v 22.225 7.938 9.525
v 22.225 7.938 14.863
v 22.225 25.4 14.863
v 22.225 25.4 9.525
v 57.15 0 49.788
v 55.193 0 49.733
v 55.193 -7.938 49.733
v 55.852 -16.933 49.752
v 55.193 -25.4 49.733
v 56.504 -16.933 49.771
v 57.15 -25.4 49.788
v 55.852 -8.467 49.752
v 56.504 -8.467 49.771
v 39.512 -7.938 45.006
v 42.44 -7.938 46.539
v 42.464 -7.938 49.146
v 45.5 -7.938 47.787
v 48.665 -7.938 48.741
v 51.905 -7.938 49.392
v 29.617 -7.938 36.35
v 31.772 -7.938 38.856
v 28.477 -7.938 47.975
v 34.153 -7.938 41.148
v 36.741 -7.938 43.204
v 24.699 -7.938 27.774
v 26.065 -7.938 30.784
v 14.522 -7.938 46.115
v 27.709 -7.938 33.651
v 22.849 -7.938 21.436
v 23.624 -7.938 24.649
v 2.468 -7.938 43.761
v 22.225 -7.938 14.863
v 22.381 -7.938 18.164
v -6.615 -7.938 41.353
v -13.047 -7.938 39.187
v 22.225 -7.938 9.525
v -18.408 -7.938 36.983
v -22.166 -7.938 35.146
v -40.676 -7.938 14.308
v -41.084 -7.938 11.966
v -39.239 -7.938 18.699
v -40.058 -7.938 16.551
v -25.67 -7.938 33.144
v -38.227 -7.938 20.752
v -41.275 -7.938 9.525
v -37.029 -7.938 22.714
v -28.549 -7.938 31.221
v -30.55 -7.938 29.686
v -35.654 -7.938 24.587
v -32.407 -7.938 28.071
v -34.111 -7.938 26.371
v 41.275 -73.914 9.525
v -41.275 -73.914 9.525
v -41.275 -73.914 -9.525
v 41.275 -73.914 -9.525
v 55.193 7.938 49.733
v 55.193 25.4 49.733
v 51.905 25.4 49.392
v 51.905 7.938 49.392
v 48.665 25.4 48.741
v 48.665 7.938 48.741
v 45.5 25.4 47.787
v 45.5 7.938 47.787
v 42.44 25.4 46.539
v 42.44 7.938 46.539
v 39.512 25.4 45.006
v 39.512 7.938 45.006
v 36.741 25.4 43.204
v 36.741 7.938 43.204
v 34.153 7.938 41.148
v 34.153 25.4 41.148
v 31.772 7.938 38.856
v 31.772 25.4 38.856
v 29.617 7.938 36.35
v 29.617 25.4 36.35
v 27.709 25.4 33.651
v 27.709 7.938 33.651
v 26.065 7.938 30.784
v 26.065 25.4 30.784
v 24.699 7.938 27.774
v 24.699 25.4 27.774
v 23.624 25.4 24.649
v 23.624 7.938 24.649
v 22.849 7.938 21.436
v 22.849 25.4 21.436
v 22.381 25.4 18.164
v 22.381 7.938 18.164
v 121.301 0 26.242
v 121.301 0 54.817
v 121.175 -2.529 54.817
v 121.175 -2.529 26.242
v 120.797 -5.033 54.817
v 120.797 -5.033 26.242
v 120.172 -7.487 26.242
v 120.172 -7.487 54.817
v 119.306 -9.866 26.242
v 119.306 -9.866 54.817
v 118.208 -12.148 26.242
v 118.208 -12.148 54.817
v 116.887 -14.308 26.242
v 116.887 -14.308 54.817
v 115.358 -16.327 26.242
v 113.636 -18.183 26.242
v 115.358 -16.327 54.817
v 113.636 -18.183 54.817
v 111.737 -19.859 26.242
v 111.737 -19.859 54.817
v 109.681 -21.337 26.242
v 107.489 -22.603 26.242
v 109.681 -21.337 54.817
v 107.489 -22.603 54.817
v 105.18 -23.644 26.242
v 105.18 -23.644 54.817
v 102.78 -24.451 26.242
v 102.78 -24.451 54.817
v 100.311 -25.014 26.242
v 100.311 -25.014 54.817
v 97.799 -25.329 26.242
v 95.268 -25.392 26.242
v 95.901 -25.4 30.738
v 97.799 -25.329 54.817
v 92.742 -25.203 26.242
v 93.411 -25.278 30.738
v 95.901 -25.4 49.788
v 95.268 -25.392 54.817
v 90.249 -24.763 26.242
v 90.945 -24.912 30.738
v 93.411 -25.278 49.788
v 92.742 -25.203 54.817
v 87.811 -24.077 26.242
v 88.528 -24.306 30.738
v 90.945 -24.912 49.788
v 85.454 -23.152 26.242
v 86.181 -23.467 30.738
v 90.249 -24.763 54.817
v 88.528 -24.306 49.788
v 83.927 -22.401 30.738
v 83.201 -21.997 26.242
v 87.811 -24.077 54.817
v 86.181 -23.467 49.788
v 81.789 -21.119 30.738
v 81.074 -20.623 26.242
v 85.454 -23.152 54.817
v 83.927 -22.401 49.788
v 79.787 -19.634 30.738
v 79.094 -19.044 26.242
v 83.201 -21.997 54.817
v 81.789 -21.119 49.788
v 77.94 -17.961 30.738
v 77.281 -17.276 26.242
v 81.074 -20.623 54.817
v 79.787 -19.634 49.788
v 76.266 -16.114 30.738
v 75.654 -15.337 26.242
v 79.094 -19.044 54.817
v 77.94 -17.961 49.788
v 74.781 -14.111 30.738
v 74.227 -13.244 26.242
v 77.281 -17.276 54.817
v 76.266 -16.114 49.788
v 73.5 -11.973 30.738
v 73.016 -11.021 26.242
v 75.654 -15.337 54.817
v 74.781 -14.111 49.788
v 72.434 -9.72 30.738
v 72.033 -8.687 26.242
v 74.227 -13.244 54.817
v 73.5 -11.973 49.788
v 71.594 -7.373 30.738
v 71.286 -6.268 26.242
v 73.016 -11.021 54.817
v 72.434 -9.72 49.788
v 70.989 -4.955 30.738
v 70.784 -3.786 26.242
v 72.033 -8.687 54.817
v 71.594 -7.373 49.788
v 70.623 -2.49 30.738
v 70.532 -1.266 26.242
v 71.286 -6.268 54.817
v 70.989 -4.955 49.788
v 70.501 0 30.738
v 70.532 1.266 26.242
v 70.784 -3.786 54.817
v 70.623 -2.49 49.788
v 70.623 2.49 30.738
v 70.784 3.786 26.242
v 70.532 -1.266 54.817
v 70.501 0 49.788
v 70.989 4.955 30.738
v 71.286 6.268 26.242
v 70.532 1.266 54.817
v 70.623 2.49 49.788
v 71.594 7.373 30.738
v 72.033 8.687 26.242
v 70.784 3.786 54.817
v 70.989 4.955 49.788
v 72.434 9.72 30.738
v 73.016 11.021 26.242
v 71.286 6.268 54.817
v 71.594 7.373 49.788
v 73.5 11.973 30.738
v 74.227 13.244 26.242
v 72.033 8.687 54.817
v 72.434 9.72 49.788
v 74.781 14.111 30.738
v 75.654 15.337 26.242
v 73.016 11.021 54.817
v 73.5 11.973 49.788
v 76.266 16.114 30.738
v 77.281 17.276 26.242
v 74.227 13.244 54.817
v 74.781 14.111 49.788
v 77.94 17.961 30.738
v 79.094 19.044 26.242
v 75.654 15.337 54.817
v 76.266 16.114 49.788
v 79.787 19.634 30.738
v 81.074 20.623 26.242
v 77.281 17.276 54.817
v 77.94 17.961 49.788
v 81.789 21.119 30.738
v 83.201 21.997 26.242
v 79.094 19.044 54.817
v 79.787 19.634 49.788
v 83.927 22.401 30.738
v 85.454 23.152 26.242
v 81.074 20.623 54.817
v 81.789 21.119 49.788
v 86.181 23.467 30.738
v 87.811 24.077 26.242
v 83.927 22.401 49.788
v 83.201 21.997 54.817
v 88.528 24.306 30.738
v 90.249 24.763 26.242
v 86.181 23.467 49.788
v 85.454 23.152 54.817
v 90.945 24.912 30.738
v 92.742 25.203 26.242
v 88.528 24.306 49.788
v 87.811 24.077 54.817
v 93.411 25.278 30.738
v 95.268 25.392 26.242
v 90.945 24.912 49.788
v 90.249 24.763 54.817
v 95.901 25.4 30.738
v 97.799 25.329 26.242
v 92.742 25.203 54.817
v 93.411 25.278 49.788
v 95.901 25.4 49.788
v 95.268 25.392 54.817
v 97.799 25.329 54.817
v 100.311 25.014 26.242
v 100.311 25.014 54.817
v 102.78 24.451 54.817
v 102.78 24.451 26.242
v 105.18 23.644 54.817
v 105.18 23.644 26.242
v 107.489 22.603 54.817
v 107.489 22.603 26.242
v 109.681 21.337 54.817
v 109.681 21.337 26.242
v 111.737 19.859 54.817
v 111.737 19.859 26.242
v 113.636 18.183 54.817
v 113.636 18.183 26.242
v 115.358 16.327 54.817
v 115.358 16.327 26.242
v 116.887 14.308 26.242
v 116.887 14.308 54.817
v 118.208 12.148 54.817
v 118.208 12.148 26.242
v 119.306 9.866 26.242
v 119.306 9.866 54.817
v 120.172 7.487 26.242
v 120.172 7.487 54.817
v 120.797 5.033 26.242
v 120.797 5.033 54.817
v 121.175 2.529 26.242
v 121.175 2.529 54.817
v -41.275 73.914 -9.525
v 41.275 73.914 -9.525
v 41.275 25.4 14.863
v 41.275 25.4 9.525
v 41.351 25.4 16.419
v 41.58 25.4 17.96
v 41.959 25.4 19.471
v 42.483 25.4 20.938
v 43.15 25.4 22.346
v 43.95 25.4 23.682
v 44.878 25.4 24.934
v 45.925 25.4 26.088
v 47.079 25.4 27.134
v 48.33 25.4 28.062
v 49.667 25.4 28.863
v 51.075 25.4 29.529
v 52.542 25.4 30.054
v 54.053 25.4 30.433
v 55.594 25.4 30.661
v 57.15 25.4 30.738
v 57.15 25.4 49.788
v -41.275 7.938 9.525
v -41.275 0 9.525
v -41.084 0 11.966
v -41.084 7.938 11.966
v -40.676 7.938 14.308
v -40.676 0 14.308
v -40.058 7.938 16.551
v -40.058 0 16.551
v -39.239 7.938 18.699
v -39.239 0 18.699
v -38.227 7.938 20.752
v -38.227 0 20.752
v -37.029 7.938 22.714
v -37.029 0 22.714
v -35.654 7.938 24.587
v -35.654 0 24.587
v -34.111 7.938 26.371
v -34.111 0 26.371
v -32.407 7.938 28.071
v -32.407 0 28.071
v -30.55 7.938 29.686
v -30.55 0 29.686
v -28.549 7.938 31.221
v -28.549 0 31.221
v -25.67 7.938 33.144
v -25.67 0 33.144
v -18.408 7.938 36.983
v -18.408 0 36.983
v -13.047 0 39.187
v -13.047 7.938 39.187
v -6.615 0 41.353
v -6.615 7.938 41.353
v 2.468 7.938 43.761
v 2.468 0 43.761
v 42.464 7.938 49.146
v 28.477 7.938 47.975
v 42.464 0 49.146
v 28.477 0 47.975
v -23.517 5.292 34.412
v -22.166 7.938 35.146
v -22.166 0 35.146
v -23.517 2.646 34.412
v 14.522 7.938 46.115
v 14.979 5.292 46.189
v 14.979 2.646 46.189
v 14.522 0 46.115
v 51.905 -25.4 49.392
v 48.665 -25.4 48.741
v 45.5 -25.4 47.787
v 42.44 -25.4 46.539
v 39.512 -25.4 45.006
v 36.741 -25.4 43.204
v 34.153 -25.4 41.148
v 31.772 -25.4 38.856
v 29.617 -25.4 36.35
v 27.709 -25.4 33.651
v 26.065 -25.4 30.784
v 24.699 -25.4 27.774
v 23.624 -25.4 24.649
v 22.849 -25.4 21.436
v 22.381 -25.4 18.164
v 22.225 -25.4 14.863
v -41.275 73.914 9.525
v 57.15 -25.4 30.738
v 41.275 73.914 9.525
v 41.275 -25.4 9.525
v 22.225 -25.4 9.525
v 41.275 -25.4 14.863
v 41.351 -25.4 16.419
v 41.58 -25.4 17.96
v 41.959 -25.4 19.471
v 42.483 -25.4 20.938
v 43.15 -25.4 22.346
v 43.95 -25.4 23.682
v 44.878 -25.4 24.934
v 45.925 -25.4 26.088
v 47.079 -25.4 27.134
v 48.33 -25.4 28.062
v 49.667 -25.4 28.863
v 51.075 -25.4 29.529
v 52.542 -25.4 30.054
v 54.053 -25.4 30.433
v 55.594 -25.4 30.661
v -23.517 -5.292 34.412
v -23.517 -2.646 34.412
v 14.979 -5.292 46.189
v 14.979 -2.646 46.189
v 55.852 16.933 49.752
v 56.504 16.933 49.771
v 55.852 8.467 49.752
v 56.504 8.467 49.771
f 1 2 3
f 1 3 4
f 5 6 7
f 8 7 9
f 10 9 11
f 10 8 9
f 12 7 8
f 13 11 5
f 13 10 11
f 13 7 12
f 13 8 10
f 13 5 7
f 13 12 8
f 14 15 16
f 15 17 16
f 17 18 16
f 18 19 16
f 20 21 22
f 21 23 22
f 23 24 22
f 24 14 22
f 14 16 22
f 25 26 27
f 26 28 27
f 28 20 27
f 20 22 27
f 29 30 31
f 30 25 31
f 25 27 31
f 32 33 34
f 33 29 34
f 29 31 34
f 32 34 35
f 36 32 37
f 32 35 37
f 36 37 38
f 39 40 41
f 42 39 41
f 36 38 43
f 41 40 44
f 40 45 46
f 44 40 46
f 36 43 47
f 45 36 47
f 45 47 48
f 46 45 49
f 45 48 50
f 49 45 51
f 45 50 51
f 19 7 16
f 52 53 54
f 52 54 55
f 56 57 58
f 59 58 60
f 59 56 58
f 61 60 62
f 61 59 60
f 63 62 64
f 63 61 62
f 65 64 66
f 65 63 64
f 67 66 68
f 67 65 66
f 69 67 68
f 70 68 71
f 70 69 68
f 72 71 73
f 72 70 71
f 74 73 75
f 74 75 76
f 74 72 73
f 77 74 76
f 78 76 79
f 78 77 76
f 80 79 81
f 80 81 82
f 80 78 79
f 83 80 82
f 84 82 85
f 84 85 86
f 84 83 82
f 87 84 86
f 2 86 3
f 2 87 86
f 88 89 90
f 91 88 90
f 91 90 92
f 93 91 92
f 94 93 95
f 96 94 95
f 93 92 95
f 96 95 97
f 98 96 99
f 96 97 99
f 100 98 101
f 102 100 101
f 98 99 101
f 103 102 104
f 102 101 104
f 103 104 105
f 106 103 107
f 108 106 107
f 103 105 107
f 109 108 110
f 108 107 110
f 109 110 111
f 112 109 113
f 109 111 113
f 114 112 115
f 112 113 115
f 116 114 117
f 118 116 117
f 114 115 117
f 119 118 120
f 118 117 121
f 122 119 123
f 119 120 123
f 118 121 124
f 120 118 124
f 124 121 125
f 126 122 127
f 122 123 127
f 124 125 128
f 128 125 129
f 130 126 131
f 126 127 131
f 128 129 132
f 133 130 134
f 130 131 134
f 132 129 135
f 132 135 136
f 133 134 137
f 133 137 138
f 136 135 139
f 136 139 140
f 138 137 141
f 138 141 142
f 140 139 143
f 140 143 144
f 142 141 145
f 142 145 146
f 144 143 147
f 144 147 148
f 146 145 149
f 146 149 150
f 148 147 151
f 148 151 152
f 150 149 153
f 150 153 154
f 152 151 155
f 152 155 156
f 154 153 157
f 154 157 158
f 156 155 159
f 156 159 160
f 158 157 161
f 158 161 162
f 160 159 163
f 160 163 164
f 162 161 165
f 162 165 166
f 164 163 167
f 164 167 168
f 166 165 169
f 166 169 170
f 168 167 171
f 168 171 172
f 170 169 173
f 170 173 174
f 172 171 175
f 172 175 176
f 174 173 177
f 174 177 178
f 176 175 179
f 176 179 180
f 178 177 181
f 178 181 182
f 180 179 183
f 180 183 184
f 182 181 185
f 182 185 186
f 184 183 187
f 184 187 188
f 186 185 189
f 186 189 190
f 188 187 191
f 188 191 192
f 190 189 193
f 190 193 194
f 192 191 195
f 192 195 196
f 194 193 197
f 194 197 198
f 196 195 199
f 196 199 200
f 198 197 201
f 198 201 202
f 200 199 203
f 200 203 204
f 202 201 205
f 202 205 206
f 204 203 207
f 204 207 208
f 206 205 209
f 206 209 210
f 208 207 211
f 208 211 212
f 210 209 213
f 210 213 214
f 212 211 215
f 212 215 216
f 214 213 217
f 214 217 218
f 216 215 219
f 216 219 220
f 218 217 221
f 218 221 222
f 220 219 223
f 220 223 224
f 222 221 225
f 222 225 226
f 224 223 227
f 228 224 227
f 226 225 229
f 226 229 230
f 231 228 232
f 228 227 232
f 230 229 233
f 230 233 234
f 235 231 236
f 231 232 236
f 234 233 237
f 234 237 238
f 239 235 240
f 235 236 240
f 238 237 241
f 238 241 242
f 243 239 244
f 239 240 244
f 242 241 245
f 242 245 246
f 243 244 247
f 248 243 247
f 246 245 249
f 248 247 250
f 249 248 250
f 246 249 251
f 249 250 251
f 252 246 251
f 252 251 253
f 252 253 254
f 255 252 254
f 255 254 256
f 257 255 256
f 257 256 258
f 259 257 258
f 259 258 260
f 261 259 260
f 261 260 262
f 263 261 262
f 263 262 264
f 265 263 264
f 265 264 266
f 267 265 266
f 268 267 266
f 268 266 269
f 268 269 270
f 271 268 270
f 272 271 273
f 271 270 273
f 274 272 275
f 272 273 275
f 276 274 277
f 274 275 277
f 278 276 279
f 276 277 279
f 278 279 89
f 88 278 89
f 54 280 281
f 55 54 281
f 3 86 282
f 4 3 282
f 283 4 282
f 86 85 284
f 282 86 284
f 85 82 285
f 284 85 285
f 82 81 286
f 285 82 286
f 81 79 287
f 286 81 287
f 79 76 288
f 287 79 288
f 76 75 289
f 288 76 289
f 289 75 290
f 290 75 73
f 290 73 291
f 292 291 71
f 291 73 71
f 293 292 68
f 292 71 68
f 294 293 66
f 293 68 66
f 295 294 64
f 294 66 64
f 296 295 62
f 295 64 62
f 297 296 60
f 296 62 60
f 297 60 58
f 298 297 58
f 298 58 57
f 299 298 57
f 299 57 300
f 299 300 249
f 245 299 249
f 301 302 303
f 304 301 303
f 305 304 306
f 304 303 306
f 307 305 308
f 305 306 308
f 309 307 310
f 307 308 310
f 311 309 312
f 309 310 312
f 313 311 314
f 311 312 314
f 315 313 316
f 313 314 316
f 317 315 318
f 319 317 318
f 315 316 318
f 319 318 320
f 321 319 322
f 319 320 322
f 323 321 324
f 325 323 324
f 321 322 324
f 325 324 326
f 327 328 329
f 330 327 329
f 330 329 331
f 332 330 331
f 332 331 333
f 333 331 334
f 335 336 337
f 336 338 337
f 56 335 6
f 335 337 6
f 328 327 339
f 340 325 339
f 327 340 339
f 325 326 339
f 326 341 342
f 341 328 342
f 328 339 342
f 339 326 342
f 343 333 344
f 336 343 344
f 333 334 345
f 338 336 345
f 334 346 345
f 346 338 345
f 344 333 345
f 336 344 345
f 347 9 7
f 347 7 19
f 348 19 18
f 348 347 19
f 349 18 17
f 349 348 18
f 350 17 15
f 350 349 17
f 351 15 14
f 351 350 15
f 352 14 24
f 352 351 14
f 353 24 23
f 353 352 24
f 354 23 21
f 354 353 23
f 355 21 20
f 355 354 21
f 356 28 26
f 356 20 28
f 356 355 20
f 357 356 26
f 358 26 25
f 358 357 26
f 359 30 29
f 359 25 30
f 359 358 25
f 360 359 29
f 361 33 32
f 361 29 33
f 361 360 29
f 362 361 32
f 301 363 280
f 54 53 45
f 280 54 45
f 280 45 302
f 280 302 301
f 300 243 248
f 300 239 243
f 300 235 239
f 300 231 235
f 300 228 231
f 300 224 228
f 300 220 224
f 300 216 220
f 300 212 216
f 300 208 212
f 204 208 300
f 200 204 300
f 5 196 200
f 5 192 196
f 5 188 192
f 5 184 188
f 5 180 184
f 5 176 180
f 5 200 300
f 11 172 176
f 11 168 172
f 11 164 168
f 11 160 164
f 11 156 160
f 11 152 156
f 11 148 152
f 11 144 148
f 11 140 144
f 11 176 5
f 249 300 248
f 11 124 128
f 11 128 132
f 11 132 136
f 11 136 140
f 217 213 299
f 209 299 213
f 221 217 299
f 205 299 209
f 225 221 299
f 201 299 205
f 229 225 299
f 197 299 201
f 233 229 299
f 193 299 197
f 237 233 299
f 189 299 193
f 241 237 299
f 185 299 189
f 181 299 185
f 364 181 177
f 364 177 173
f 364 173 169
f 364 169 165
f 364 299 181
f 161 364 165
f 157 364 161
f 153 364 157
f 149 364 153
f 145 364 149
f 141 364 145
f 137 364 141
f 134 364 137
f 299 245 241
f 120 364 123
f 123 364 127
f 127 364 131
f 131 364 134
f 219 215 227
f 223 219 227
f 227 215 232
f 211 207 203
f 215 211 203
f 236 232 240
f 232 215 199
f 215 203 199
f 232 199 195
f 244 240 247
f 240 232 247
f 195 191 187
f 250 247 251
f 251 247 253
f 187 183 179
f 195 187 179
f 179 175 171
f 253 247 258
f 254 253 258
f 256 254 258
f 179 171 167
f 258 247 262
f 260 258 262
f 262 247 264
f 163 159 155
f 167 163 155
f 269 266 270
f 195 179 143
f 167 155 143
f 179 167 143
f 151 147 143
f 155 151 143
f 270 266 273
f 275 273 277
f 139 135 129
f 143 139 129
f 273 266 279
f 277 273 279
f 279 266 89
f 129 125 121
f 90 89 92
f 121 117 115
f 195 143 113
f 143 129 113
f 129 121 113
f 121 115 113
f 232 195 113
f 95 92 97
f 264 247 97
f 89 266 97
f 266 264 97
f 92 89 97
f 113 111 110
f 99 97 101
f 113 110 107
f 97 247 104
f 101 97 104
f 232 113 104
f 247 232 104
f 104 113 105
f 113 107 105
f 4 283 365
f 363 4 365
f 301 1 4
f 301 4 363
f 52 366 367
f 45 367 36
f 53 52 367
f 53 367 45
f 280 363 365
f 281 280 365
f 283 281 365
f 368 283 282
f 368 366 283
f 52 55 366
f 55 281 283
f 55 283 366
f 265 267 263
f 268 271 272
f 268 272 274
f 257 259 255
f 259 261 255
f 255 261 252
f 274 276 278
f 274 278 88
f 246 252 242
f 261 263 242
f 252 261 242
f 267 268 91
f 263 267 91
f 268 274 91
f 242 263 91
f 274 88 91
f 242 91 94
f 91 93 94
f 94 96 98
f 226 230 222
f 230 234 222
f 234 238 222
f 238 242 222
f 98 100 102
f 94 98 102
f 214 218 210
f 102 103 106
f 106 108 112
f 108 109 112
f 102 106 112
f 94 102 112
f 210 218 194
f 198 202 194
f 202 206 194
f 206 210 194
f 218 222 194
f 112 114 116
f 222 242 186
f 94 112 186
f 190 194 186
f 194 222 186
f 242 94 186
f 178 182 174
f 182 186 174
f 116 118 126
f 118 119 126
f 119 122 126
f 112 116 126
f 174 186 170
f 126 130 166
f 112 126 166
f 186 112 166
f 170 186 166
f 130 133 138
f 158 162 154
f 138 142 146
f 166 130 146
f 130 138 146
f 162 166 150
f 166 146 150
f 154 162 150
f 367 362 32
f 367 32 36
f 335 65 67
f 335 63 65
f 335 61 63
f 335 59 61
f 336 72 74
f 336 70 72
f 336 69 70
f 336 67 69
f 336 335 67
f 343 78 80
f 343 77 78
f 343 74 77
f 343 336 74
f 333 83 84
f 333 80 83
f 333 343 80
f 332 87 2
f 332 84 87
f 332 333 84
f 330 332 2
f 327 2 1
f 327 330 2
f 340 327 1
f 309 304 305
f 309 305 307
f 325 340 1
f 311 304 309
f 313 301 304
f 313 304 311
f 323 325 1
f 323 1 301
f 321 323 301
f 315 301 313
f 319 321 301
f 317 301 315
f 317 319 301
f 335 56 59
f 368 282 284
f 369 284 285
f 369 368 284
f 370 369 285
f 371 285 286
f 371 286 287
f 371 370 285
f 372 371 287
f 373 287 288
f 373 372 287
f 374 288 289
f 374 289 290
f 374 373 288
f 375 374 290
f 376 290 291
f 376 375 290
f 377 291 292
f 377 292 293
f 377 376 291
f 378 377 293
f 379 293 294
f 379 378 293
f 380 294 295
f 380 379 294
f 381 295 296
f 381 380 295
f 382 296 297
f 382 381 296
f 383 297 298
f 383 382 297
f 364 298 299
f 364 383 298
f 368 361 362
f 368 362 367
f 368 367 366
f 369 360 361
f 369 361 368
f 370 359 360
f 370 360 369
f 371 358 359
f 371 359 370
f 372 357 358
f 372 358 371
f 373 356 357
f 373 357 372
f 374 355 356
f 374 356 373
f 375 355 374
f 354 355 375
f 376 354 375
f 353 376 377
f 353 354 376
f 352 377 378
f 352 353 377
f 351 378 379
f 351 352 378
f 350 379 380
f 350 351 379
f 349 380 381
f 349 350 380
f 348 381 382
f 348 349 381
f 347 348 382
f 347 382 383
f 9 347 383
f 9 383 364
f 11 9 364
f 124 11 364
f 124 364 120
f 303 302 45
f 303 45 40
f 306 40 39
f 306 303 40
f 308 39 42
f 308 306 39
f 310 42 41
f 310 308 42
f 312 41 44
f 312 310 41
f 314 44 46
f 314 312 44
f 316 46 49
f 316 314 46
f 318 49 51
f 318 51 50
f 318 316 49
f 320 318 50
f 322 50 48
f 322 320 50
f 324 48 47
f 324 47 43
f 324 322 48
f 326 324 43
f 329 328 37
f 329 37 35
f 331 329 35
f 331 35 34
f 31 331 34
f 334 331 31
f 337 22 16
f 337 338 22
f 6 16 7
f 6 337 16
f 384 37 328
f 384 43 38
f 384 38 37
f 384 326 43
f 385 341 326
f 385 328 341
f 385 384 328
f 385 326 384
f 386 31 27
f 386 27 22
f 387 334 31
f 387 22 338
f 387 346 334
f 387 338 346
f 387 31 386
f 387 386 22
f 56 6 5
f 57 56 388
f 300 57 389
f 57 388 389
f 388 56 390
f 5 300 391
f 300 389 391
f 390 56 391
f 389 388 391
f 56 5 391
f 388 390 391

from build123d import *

# Parameters (mm, degrees)
F1_DEPTH      = 73.914
F1_DEPTH_BACK = 73.914
F2_DEPTH      = 7.9375
F3_DEPTH      = 25.4


with BuildPart() as f1:
    # F0 (on Front) → F1 (new body, two sides)
    with BuildSketch(Plane.XZ) as f1_sk:
        Polygon((-41.275, 9.525), (-41.275, -9.525), (41.275, -9.525), (41.275, 9.525), (22.225, 9.525), align=None)
    extrude(amount=F1_DEPTH)
    extrude(f1_sk.sketch, amount=-F1_DEPTH_BACK)

    # F0 (on Front) → F2 (join, symmetric)
    with BuildSketch(Plane.XZ):
        with BuildLine():
            add(Edge.make_bspline(
                [(-41.275, 9.525), (-40.226812, 42.592709), (20.461641, 48.679743), (55.192691, 49.732862)],
                knots=[0, 0, 0, 0, 104.352522, 104.352522, 104.352522, 104.352522], degree=3))
            Line((-41.275, 9.525), (22.225, 9.525))
            Line((22.225, 9.525), (22.225, 14.862752))
            ThreePointArc((22.225, 14.862752), (31.771716, 38.856466), (55.192691, 49.732862))
        make_face()
    extrude(amount=F2_DEPTH, both=True)

    # F0 (on Front) → F3 (join, symmetric)
    with BuildSketch(Plane.XZ):
        Polygon((89.471519, 49.787752), (70.500782, 49.787752), (70.500782, 30.737752), (89.471519, 30.737752), (95.900782, 30.737752), (95.900782, 49.787752), align=None)
        with BuildLine():
            Line((22.225, 9.525), (41.275, 9.525))
            Line((41.275, 9.525), (41.275, 14.862752))
            ThreePointArc((41.275, 14.862752), (45.92468, 26.088072), (57.15, 30.737752))
            Line((57.15, 30.737752), (70.500782, 30.737752))
            Line((70.500782, 30.737752), (70.500782, 49.787752))
            Line((70.500782, 49.787752), (57.15, 49.787752))
            add(Edge.make_bspline(
                [(55.192691, 49.732862), (55.854758, 49.752937), (56.507392, 49.771183), (57.15, 49.787752)],
                knots=[104.352522, 104.352522, 104.352522, 104.352522, 106.34176, 106.34176, 106.34176, 106.34176], degree=3))
            ThreePointArc((55.192691, 49.732862), (31.771716, 38.856466), (22.225, 14.862752))
            Line((22.225, 14.862752), (22.225, 9.525))
        make_face()
    extrude(amount=F3_DEPTH, both=True)

    # F0 (on Front) → F4 (revolve)
    with BuildSketch(Plane.XZ):
        Polygon((121.300782, 54.816952), (95.900782, 54.816952), (95.900782, 49.787752), (95.900782, 30.737752), (95.900782, 26.241952), (121.300782, 26.241952), align=None)
    revolve(axis=Axis((95.900782, 0, 40.529452), (0, 0, -1)))


solid = f1.part
